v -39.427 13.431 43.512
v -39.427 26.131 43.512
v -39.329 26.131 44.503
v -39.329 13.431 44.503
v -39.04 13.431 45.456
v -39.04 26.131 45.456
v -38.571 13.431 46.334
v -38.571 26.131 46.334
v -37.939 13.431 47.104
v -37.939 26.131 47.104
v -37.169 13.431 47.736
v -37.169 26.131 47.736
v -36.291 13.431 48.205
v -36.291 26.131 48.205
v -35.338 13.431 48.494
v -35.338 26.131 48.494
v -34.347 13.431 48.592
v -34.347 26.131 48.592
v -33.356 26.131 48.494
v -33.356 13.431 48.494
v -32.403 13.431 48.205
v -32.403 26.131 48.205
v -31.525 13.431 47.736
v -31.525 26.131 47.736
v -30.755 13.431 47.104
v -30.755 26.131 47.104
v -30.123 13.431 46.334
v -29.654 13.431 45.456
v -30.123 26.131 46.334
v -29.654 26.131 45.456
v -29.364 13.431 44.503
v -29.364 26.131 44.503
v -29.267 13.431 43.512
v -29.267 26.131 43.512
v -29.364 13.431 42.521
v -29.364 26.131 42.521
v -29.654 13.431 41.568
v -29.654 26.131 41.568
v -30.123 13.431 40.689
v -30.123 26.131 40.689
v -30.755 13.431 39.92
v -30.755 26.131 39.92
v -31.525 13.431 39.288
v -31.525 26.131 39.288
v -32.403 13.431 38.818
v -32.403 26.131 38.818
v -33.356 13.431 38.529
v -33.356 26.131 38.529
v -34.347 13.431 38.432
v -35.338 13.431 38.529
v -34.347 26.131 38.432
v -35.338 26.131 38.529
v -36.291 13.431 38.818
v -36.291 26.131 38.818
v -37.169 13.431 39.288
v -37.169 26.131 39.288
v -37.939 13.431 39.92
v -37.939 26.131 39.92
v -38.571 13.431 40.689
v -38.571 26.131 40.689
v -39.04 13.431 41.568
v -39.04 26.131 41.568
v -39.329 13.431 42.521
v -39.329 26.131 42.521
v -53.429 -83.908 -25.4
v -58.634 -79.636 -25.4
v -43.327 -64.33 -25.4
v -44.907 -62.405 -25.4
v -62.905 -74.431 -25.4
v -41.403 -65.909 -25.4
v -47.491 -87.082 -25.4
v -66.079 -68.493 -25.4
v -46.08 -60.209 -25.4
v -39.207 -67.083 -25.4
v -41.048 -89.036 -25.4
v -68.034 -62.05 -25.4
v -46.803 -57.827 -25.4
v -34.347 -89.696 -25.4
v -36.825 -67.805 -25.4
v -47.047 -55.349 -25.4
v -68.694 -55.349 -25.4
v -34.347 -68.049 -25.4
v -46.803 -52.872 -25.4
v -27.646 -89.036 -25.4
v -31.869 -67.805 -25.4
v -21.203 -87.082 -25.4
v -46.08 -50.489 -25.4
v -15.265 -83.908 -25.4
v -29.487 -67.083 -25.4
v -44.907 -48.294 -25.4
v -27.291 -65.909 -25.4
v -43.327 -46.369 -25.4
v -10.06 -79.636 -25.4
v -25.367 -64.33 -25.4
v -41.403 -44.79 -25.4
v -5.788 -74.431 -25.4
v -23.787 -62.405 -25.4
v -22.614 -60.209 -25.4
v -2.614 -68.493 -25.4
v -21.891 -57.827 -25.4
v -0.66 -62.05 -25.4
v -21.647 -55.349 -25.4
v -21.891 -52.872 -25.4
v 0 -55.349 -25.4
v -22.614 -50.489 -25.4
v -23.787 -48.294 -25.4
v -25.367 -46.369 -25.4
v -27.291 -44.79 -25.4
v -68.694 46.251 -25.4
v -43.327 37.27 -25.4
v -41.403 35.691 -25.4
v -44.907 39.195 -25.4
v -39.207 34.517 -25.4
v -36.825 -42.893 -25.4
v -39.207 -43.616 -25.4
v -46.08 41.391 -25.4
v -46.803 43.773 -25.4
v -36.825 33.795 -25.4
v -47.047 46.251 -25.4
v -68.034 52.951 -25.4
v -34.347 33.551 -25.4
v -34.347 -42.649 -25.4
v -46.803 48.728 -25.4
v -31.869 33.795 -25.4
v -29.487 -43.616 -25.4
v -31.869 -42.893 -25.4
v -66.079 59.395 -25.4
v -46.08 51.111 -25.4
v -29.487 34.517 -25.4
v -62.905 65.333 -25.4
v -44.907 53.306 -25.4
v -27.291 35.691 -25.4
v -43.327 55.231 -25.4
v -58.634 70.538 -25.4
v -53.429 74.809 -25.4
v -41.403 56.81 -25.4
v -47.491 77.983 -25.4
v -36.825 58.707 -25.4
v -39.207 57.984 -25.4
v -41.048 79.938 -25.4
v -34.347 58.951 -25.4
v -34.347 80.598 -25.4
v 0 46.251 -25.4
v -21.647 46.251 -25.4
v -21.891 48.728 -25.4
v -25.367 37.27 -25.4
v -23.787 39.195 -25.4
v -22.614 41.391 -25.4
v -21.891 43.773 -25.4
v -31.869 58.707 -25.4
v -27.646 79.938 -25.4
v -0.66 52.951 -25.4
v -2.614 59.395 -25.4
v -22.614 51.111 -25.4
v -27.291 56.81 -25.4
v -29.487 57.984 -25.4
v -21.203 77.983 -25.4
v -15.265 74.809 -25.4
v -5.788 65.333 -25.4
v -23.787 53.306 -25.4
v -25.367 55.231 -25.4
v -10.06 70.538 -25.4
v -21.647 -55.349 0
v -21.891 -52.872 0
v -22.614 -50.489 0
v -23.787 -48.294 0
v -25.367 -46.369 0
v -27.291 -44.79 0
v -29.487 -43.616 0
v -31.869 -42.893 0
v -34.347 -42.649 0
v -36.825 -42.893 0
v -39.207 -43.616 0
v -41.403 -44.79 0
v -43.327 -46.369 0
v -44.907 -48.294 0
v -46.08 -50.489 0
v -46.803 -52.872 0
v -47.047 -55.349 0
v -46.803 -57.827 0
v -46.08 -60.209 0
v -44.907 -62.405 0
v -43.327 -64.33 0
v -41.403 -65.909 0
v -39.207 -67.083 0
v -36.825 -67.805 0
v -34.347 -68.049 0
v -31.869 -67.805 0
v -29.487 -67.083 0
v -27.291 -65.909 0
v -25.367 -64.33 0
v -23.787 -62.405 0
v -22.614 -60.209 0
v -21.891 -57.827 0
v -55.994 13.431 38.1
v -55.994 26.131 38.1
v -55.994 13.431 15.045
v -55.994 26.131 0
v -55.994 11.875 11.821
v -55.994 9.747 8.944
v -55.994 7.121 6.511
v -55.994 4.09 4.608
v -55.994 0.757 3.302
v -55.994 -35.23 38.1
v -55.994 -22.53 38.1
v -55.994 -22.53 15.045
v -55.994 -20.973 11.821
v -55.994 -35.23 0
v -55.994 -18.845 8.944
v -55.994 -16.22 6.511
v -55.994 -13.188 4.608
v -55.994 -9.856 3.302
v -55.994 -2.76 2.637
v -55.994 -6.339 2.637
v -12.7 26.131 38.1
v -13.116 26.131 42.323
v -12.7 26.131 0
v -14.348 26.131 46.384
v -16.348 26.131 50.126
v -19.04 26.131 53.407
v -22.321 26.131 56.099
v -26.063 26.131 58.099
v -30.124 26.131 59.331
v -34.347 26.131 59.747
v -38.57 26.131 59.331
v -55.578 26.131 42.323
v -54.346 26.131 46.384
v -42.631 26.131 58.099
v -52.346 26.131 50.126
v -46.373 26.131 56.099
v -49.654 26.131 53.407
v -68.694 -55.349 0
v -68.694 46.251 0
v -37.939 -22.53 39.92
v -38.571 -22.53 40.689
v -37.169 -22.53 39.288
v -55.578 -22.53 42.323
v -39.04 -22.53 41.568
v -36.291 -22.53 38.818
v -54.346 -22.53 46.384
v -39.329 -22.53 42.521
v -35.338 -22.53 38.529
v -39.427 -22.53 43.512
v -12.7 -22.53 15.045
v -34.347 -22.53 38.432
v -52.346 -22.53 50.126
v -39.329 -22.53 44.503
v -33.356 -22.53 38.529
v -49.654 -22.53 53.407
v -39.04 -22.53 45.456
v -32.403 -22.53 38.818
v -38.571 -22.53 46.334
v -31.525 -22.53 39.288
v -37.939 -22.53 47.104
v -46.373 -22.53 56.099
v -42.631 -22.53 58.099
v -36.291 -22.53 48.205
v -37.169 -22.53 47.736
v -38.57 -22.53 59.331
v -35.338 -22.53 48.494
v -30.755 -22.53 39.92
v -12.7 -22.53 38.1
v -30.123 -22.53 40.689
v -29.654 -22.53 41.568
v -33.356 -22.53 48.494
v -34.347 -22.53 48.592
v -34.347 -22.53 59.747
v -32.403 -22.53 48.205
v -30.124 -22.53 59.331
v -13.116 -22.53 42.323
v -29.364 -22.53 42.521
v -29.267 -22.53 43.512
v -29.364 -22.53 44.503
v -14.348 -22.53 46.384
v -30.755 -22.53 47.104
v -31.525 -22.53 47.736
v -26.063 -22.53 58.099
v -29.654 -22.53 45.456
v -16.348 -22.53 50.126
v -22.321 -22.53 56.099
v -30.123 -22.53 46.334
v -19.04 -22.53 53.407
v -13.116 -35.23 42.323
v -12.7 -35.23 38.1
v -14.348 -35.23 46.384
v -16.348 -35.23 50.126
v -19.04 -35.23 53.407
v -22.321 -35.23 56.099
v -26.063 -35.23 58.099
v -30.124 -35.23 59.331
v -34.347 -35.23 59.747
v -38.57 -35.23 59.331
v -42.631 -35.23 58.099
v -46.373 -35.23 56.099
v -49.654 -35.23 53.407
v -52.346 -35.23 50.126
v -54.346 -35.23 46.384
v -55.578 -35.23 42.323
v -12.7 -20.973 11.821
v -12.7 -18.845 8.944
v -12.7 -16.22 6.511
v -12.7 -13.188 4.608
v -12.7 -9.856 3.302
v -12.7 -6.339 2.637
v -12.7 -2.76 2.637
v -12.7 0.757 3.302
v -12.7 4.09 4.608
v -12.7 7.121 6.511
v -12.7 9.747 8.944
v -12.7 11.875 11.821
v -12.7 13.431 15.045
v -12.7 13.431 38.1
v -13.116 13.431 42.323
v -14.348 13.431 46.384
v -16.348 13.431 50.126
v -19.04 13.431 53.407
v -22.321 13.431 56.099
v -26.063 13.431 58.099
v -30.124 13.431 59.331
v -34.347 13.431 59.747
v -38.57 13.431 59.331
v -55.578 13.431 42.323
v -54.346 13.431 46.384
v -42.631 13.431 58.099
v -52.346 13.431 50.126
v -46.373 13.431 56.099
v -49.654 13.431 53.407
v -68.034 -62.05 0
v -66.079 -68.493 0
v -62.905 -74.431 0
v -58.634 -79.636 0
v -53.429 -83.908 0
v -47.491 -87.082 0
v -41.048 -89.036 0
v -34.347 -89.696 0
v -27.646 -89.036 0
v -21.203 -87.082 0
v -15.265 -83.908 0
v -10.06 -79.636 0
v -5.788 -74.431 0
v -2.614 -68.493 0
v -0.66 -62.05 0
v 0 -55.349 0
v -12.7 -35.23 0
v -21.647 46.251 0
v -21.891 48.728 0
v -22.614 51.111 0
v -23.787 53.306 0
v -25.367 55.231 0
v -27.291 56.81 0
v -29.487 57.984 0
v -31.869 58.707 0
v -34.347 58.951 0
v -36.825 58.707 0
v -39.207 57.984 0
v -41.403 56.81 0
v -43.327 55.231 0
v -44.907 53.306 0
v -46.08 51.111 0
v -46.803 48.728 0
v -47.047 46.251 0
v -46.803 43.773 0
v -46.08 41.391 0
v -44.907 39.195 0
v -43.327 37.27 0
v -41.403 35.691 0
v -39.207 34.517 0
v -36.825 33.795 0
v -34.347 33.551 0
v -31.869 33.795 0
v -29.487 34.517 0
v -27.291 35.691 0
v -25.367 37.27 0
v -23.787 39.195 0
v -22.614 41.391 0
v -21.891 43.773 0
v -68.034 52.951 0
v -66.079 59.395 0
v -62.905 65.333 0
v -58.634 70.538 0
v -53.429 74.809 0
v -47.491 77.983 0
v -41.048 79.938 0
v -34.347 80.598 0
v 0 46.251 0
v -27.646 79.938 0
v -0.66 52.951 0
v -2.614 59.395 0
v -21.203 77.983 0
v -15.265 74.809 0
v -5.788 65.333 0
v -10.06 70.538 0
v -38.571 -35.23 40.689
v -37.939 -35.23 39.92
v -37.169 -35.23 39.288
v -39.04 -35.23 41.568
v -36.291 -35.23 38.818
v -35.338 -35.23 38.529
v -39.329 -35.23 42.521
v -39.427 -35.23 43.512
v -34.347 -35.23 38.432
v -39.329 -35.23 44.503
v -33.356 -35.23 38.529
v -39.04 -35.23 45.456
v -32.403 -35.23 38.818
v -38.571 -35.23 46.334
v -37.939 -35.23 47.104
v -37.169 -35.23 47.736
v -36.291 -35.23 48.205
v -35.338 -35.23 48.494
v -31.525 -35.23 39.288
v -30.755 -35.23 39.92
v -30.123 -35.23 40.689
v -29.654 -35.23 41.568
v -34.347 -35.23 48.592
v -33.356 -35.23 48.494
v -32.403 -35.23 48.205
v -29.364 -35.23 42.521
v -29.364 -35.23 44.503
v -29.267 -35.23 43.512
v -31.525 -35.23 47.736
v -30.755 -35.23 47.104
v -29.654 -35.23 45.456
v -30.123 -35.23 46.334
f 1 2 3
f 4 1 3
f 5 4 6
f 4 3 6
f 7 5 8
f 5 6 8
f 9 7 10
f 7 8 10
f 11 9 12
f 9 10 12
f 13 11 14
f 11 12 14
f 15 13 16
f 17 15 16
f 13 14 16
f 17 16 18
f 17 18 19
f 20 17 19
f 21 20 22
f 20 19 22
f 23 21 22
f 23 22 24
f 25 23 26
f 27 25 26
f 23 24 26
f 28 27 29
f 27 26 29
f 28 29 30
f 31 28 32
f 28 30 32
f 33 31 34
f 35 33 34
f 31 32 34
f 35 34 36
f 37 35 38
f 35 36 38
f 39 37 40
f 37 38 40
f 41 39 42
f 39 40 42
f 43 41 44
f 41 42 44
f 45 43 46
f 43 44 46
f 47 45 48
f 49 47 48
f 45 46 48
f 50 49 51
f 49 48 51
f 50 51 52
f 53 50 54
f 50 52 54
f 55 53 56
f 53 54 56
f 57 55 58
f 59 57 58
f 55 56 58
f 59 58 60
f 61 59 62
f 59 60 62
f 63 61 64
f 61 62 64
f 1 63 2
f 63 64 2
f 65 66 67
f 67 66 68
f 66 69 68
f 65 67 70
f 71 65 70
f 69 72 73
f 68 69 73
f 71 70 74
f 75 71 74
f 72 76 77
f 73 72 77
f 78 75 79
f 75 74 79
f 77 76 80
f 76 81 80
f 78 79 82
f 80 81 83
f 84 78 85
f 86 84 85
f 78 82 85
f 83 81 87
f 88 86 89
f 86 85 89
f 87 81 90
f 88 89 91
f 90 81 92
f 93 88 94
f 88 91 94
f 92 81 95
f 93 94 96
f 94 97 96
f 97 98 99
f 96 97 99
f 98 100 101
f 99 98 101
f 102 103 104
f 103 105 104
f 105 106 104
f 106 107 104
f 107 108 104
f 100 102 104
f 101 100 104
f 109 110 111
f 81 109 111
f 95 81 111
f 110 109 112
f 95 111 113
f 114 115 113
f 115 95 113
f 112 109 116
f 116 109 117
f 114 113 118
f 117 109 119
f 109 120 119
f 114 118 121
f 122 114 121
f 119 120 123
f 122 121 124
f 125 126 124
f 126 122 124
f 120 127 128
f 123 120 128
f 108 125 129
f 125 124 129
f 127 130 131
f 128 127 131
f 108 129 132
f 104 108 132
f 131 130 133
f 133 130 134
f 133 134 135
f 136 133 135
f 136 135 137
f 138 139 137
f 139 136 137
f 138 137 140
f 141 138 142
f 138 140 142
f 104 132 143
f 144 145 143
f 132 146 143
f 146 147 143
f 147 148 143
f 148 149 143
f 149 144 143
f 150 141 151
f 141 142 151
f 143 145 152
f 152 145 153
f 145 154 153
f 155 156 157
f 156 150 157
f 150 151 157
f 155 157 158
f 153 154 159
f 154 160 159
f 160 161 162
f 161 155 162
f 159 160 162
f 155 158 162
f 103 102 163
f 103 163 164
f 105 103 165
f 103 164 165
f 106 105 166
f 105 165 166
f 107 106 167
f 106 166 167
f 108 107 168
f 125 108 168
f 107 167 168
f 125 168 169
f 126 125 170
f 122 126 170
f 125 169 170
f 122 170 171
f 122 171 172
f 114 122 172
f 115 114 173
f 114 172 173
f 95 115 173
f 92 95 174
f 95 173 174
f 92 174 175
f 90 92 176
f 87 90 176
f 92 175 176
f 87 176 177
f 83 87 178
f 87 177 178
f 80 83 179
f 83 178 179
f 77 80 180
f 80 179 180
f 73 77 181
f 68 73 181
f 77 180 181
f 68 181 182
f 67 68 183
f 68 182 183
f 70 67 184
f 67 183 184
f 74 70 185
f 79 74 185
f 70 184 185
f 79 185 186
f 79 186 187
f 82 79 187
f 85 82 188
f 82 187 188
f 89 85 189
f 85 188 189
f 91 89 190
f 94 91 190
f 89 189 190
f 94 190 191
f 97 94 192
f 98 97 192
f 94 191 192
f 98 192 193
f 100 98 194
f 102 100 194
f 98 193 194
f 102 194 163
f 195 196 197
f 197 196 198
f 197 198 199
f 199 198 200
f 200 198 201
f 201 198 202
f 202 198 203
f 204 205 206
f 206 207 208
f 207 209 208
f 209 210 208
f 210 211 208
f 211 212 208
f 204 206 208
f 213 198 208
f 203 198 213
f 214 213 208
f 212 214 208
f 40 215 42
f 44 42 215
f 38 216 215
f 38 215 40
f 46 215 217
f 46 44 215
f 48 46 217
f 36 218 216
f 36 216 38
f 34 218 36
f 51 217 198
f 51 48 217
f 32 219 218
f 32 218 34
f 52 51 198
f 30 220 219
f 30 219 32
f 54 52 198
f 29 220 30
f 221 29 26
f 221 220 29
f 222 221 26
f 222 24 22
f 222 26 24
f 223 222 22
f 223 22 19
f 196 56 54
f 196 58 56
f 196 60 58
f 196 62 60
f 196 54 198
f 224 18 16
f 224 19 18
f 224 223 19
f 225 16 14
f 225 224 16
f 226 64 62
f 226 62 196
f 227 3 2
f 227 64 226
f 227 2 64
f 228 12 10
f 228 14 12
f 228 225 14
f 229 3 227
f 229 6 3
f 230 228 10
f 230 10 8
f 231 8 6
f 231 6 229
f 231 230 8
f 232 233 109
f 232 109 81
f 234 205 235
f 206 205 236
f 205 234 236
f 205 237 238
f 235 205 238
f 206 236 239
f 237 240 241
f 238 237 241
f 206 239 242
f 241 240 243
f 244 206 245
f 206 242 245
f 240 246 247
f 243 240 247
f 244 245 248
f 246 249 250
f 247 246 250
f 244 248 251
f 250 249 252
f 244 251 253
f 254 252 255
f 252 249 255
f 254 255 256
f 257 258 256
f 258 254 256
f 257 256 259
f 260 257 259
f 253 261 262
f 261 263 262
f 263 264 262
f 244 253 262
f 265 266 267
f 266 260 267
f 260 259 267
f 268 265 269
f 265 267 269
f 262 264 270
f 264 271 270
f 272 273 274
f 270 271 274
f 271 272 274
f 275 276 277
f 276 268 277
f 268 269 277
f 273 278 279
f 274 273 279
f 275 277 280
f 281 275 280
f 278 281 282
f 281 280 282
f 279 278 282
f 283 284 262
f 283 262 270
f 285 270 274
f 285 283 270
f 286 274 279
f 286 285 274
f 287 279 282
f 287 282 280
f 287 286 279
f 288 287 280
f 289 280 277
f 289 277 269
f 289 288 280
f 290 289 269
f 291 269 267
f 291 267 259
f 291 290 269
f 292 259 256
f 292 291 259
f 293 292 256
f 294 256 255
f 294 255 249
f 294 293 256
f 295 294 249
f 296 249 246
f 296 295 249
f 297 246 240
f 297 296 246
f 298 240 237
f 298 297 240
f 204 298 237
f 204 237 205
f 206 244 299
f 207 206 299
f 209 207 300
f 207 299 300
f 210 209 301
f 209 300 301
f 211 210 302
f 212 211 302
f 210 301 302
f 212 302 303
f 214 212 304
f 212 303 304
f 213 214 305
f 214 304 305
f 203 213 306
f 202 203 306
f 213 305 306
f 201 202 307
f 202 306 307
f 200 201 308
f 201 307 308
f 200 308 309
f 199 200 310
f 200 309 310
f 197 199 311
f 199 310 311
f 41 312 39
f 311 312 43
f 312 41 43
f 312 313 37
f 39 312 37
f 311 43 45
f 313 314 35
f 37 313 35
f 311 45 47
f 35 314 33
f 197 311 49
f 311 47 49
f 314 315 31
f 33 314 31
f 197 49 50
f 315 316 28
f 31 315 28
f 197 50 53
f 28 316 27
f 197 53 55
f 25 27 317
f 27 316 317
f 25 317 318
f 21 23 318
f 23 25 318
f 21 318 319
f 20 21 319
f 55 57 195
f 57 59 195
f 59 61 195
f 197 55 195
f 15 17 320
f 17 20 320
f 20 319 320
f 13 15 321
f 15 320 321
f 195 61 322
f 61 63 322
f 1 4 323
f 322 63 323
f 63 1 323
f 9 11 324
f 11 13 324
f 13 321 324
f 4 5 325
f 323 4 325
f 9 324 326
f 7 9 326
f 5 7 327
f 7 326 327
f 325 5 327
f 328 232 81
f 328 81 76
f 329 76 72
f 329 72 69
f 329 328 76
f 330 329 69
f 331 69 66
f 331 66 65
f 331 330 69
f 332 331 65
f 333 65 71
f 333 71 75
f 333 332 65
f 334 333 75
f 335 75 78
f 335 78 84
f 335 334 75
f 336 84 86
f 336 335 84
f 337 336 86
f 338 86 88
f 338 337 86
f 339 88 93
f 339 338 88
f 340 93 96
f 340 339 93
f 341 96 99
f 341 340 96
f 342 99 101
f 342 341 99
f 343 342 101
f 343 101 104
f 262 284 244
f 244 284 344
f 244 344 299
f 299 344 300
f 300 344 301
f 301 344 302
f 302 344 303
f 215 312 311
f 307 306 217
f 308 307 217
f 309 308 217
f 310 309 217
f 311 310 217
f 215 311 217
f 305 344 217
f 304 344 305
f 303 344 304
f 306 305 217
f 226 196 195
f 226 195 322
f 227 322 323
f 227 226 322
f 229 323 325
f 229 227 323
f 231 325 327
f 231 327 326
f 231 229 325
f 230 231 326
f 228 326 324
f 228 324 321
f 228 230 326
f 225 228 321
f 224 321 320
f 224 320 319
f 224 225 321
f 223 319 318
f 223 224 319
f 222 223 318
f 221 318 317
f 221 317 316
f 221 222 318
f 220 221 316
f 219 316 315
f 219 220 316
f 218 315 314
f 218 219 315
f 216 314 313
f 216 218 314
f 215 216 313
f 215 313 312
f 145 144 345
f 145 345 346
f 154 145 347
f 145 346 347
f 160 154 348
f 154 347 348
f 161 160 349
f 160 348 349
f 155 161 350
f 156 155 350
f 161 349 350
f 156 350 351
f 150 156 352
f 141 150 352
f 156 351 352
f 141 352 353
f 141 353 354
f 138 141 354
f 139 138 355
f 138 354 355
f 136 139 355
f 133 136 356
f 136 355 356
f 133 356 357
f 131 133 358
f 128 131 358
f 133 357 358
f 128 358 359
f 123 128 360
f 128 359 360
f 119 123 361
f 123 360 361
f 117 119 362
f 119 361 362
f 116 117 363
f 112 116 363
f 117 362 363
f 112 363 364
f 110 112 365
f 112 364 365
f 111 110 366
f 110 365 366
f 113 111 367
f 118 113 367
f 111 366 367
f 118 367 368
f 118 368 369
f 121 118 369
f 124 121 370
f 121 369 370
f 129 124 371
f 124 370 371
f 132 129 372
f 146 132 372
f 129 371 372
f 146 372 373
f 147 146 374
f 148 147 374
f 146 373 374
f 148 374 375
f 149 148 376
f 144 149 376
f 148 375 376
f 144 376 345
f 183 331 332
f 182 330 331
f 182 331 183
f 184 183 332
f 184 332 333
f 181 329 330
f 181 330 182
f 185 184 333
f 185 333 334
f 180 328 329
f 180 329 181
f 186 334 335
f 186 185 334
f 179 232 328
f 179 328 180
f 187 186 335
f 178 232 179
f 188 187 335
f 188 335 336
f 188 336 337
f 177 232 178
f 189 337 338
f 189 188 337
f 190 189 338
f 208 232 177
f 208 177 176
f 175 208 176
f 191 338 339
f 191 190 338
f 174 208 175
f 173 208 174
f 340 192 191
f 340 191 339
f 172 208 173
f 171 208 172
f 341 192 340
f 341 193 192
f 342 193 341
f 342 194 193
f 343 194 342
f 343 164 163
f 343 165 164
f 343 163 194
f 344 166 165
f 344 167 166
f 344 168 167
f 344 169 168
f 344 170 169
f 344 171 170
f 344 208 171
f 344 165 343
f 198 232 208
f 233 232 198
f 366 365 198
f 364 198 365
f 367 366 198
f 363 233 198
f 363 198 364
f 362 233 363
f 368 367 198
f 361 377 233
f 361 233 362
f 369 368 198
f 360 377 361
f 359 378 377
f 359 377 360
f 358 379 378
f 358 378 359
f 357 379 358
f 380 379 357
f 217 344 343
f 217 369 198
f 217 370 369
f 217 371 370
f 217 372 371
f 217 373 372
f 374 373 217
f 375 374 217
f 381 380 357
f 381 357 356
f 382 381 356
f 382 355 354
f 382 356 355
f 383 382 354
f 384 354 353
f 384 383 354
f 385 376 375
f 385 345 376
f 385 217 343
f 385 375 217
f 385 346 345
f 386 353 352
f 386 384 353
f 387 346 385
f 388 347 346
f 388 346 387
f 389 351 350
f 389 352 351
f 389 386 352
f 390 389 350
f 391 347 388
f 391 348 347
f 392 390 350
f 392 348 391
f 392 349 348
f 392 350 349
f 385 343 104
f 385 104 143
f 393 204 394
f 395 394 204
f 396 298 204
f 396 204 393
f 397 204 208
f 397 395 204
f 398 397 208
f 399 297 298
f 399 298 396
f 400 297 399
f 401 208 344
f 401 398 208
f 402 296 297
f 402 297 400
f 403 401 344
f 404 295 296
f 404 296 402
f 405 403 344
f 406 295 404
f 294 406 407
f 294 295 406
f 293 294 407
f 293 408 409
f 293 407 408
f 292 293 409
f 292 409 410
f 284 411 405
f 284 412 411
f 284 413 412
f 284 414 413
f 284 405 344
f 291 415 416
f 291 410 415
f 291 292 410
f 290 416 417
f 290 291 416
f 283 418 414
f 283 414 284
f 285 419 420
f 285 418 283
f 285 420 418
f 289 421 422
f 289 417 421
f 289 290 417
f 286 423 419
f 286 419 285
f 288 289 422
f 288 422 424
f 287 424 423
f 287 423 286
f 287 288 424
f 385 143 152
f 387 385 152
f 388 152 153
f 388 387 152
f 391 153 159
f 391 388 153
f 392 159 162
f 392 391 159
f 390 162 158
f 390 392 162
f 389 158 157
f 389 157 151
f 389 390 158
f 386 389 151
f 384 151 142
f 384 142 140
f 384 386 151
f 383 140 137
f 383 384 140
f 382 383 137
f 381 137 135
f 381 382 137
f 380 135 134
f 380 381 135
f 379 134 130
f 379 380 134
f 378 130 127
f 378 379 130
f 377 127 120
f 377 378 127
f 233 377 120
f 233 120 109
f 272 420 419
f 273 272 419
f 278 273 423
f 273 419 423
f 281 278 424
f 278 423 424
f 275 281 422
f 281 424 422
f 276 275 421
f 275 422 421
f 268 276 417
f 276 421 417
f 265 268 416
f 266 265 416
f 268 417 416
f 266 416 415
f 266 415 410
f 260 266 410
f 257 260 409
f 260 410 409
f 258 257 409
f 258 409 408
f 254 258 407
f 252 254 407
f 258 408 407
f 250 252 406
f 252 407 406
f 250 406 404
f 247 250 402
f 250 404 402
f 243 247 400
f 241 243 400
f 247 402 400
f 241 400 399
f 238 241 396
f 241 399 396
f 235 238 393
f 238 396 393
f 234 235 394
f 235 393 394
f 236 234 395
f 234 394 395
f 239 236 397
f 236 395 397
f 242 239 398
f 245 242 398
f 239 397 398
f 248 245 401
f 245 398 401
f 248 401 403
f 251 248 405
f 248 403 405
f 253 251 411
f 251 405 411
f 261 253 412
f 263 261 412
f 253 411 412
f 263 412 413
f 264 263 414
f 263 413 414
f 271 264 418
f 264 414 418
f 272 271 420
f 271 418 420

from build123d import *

# Parameters (mm, degrees)
F0_R     = 12.7
F1_DEPTH = 25.4
F3_DEPTH = 38.1
F5_DEPTH = 69.088
F7_R     = 5.08
F8_DEPTH = 12.7
F6_R     = 5.08
F9_DEPTH = 12.7


# Not quite as in the source:
# - a feature names something its author has since deleted; it is built from what else it names


with BuildPart() as f1:
    # F0 (on Top) → F1 (new body)
    with BuildSketch(Plane.XY):
        with BuildLine():
            Line((0, -55.3492553601), (0, 0))
            Line((0, 0), (0, 46.2507446399))
            ThreePointArc((0, 46.2507446399), (-34.3468652373, 80.5976098772), (-68.6937304746, 46.2507446399))
            Line((-68.6937304746, 46.2507446399), (-68.6937304746, -55.3492553601))
            ThreePointArc((-68.6937304746, -55.3492553601), (-34.3468652373, -89.6961205974), (0, -55.3492553601))
        make_face()
        with Locations((-34.3468652373, -55.3492553601)):
            Circle(F0_R, mode=Mode.SUBTRACT)
        with Locations((-34.3468652373, 46.2507446399)):
            Circle(F0_R, mode=Mode.SUBTRACT)
    extrude(amount=-F1_DEPTH)

    # F2 (on face) → F3 (join)
    with BuildSketch(Plane.XY):
        Polygon((-55.9937304746, 26.1313845437), (-55.9937304746, -4.5492553601), (-55.9937304746, -35.2298952639), (-12.7, -35.2298952639), (-12.7, -4.5492553601), (-12.7, 26.1313845437), align=None)
    extrude(amount=F3_DEPTH)

    # F4 (on face) → F5 (cut)
    with BuildSketch(Plane.YZ.offset(-12.7)):
        with BuildLine():
            Line((13.4313845437, 38.1), (-22.5298952639, 38.1))
            Line((-22.5298952639, 38.1), (-22.5298952639, 15.044502914))
            ThreePointArc((-22.5298952639, 15.044502914), (-4.5492553601, 2.5536219989), (13.4313845437, 15.044502914))
            Line((13.4313845437, 15.044502914), (13.4313845437, 38.1))
        make_face()
    extrude(amount=-F5_DEPTH, mode=Mode.SUBTRACT)

    # F7 (on face) → F8 (join)
    with BuildSketch(Plane(origin=(0, 26.1313845437, 0), x_dir=(-1, 0, 0), z_dir=(0, 1, 0))):
        with BuildLine():
            Line((12.7, 38.1), (55.9937304746, 38.1))
            ThreePointArc((55.9937304746, 38.1), (34.3468652373, 59.7468652373), (12.7, 38.1))
        make_face()
        with Locations((34.3468652373, 43.5117163093)):
            Circle(F7_R, mode=Mode.SUBTRACT)
    extrude(amount=-F8_DEPTH)

    # F6 (on face) → F9 (join)
    with BuildSketch(Plane.XZ.offset(35.2298952639)):
        with BuildLine():
            Line((-55.9937304746, 38.1), (-12.7, 38.1))
            ThreePointArc((-12.7, 38.1), (-34.3468652373, 59.7468652373), (-55.9937304746, 38.1))
        make_face()
        with Locations((-34.3468652373, 43.5117163093)):
            Circle(F6_R, mode=Mode.SUBTRACT)
    extrude(amount=-F9_DEPTH)


solid = f1.part
